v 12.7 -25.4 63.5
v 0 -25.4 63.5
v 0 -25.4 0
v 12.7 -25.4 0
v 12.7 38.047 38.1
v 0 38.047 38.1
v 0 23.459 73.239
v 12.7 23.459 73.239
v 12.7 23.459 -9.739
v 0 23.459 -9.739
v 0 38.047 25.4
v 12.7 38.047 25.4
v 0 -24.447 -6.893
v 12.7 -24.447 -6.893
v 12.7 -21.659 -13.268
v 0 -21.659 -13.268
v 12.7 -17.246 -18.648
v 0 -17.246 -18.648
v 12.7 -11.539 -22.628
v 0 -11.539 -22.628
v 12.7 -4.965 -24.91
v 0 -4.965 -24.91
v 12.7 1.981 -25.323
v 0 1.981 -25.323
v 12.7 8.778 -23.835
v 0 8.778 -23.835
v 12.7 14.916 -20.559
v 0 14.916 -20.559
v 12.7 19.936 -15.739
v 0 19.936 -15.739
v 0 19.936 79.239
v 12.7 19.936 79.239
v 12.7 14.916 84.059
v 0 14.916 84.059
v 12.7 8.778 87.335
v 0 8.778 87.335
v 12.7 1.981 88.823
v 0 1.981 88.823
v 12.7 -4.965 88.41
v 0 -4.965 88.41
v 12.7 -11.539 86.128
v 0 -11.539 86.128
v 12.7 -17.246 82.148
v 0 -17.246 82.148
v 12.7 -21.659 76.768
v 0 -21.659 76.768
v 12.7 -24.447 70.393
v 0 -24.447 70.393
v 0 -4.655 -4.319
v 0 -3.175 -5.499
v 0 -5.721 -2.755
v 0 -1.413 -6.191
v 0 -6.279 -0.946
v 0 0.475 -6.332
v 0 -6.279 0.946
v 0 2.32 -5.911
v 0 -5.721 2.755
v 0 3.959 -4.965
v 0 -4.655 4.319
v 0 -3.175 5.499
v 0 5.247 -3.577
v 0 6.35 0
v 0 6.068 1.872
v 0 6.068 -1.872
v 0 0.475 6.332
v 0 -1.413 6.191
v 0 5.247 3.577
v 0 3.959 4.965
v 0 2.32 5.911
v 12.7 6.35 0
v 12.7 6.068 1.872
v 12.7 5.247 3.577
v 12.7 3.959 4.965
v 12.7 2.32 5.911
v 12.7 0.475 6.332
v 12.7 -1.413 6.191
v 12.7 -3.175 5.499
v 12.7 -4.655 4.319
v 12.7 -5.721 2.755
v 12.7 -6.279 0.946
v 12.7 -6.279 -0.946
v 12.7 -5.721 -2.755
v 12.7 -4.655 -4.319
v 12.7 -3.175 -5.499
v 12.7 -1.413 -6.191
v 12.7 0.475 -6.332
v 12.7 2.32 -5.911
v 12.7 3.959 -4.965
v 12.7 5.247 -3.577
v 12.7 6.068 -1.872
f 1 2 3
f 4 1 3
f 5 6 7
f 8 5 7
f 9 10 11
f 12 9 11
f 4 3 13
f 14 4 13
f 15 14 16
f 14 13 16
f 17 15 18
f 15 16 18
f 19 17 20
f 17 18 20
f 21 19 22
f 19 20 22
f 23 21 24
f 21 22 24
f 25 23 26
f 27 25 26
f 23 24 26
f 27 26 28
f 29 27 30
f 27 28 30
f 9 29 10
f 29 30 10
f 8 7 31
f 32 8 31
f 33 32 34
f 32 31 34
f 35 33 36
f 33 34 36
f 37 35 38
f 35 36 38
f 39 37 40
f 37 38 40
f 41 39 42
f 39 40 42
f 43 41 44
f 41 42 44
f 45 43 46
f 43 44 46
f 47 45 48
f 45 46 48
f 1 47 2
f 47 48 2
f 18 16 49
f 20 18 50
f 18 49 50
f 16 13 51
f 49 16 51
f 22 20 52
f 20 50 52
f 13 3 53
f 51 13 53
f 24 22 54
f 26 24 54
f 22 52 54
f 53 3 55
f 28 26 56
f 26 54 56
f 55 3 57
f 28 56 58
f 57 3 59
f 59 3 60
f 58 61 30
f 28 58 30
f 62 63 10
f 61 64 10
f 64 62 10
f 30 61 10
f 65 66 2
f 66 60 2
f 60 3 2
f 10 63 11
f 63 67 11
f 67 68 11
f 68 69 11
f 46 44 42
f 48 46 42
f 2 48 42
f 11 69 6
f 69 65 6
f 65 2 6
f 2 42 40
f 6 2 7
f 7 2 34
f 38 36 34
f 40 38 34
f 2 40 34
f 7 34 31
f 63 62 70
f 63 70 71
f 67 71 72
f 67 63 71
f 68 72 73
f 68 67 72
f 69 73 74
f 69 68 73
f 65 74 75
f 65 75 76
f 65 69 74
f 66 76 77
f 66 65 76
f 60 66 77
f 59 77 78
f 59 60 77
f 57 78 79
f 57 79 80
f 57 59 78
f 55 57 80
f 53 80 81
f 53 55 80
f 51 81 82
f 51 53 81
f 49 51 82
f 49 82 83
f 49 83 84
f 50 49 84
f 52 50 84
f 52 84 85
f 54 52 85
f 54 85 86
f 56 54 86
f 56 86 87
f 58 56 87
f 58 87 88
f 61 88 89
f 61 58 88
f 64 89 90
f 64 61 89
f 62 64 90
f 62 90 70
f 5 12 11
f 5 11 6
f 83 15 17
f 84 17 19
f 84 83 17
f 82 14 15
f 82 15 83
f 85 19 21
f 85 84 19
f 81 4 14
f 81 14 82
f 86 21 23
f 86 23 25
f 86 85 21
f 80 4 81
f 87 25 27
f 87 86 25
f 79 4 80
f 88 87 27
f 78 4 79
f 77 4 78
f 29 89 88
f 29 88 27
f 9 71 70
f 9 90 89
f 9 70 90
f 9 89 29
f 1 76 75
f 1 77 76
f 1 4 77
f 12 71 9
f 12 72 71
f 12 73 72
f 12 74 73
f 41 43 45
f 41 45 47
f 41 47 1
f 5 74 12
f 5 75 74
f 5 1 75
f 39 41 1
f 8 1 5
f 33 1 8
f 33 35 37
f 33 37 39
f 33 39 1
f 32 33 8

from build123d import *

# Parameters (mm, degrees)
F0_R     = 6.35
F1_DEPTH = 12.7


with BuildPart() as f1:
    # F0 (on Right) → F1 (new body)
    with BuildSketch(Plane.YZ):
        with BuildLine():
            ThreePointArc((-25.4, 0), (-4.965342, -24.909945), (23.458691, -9.739087))
            Line((23.458691, -9.739087), (38.047, 25.4))
            Line((38.047, 25.4), (38.047, 38.1))
            Line((38.047, 38.1), (23.458691, 73.239087))
            ThreePointArc((23.458691, 73.239087), (-4.965342, 88.409945), (-25.4, 63.5))
            Line((-25.4, 63.5), (-25.4, 0))
        make_face()
        Circle(F0_R, mode=Mode.SUBTRACT)
    extrude(amount=F1_DEPTH)


solid = f1.part
